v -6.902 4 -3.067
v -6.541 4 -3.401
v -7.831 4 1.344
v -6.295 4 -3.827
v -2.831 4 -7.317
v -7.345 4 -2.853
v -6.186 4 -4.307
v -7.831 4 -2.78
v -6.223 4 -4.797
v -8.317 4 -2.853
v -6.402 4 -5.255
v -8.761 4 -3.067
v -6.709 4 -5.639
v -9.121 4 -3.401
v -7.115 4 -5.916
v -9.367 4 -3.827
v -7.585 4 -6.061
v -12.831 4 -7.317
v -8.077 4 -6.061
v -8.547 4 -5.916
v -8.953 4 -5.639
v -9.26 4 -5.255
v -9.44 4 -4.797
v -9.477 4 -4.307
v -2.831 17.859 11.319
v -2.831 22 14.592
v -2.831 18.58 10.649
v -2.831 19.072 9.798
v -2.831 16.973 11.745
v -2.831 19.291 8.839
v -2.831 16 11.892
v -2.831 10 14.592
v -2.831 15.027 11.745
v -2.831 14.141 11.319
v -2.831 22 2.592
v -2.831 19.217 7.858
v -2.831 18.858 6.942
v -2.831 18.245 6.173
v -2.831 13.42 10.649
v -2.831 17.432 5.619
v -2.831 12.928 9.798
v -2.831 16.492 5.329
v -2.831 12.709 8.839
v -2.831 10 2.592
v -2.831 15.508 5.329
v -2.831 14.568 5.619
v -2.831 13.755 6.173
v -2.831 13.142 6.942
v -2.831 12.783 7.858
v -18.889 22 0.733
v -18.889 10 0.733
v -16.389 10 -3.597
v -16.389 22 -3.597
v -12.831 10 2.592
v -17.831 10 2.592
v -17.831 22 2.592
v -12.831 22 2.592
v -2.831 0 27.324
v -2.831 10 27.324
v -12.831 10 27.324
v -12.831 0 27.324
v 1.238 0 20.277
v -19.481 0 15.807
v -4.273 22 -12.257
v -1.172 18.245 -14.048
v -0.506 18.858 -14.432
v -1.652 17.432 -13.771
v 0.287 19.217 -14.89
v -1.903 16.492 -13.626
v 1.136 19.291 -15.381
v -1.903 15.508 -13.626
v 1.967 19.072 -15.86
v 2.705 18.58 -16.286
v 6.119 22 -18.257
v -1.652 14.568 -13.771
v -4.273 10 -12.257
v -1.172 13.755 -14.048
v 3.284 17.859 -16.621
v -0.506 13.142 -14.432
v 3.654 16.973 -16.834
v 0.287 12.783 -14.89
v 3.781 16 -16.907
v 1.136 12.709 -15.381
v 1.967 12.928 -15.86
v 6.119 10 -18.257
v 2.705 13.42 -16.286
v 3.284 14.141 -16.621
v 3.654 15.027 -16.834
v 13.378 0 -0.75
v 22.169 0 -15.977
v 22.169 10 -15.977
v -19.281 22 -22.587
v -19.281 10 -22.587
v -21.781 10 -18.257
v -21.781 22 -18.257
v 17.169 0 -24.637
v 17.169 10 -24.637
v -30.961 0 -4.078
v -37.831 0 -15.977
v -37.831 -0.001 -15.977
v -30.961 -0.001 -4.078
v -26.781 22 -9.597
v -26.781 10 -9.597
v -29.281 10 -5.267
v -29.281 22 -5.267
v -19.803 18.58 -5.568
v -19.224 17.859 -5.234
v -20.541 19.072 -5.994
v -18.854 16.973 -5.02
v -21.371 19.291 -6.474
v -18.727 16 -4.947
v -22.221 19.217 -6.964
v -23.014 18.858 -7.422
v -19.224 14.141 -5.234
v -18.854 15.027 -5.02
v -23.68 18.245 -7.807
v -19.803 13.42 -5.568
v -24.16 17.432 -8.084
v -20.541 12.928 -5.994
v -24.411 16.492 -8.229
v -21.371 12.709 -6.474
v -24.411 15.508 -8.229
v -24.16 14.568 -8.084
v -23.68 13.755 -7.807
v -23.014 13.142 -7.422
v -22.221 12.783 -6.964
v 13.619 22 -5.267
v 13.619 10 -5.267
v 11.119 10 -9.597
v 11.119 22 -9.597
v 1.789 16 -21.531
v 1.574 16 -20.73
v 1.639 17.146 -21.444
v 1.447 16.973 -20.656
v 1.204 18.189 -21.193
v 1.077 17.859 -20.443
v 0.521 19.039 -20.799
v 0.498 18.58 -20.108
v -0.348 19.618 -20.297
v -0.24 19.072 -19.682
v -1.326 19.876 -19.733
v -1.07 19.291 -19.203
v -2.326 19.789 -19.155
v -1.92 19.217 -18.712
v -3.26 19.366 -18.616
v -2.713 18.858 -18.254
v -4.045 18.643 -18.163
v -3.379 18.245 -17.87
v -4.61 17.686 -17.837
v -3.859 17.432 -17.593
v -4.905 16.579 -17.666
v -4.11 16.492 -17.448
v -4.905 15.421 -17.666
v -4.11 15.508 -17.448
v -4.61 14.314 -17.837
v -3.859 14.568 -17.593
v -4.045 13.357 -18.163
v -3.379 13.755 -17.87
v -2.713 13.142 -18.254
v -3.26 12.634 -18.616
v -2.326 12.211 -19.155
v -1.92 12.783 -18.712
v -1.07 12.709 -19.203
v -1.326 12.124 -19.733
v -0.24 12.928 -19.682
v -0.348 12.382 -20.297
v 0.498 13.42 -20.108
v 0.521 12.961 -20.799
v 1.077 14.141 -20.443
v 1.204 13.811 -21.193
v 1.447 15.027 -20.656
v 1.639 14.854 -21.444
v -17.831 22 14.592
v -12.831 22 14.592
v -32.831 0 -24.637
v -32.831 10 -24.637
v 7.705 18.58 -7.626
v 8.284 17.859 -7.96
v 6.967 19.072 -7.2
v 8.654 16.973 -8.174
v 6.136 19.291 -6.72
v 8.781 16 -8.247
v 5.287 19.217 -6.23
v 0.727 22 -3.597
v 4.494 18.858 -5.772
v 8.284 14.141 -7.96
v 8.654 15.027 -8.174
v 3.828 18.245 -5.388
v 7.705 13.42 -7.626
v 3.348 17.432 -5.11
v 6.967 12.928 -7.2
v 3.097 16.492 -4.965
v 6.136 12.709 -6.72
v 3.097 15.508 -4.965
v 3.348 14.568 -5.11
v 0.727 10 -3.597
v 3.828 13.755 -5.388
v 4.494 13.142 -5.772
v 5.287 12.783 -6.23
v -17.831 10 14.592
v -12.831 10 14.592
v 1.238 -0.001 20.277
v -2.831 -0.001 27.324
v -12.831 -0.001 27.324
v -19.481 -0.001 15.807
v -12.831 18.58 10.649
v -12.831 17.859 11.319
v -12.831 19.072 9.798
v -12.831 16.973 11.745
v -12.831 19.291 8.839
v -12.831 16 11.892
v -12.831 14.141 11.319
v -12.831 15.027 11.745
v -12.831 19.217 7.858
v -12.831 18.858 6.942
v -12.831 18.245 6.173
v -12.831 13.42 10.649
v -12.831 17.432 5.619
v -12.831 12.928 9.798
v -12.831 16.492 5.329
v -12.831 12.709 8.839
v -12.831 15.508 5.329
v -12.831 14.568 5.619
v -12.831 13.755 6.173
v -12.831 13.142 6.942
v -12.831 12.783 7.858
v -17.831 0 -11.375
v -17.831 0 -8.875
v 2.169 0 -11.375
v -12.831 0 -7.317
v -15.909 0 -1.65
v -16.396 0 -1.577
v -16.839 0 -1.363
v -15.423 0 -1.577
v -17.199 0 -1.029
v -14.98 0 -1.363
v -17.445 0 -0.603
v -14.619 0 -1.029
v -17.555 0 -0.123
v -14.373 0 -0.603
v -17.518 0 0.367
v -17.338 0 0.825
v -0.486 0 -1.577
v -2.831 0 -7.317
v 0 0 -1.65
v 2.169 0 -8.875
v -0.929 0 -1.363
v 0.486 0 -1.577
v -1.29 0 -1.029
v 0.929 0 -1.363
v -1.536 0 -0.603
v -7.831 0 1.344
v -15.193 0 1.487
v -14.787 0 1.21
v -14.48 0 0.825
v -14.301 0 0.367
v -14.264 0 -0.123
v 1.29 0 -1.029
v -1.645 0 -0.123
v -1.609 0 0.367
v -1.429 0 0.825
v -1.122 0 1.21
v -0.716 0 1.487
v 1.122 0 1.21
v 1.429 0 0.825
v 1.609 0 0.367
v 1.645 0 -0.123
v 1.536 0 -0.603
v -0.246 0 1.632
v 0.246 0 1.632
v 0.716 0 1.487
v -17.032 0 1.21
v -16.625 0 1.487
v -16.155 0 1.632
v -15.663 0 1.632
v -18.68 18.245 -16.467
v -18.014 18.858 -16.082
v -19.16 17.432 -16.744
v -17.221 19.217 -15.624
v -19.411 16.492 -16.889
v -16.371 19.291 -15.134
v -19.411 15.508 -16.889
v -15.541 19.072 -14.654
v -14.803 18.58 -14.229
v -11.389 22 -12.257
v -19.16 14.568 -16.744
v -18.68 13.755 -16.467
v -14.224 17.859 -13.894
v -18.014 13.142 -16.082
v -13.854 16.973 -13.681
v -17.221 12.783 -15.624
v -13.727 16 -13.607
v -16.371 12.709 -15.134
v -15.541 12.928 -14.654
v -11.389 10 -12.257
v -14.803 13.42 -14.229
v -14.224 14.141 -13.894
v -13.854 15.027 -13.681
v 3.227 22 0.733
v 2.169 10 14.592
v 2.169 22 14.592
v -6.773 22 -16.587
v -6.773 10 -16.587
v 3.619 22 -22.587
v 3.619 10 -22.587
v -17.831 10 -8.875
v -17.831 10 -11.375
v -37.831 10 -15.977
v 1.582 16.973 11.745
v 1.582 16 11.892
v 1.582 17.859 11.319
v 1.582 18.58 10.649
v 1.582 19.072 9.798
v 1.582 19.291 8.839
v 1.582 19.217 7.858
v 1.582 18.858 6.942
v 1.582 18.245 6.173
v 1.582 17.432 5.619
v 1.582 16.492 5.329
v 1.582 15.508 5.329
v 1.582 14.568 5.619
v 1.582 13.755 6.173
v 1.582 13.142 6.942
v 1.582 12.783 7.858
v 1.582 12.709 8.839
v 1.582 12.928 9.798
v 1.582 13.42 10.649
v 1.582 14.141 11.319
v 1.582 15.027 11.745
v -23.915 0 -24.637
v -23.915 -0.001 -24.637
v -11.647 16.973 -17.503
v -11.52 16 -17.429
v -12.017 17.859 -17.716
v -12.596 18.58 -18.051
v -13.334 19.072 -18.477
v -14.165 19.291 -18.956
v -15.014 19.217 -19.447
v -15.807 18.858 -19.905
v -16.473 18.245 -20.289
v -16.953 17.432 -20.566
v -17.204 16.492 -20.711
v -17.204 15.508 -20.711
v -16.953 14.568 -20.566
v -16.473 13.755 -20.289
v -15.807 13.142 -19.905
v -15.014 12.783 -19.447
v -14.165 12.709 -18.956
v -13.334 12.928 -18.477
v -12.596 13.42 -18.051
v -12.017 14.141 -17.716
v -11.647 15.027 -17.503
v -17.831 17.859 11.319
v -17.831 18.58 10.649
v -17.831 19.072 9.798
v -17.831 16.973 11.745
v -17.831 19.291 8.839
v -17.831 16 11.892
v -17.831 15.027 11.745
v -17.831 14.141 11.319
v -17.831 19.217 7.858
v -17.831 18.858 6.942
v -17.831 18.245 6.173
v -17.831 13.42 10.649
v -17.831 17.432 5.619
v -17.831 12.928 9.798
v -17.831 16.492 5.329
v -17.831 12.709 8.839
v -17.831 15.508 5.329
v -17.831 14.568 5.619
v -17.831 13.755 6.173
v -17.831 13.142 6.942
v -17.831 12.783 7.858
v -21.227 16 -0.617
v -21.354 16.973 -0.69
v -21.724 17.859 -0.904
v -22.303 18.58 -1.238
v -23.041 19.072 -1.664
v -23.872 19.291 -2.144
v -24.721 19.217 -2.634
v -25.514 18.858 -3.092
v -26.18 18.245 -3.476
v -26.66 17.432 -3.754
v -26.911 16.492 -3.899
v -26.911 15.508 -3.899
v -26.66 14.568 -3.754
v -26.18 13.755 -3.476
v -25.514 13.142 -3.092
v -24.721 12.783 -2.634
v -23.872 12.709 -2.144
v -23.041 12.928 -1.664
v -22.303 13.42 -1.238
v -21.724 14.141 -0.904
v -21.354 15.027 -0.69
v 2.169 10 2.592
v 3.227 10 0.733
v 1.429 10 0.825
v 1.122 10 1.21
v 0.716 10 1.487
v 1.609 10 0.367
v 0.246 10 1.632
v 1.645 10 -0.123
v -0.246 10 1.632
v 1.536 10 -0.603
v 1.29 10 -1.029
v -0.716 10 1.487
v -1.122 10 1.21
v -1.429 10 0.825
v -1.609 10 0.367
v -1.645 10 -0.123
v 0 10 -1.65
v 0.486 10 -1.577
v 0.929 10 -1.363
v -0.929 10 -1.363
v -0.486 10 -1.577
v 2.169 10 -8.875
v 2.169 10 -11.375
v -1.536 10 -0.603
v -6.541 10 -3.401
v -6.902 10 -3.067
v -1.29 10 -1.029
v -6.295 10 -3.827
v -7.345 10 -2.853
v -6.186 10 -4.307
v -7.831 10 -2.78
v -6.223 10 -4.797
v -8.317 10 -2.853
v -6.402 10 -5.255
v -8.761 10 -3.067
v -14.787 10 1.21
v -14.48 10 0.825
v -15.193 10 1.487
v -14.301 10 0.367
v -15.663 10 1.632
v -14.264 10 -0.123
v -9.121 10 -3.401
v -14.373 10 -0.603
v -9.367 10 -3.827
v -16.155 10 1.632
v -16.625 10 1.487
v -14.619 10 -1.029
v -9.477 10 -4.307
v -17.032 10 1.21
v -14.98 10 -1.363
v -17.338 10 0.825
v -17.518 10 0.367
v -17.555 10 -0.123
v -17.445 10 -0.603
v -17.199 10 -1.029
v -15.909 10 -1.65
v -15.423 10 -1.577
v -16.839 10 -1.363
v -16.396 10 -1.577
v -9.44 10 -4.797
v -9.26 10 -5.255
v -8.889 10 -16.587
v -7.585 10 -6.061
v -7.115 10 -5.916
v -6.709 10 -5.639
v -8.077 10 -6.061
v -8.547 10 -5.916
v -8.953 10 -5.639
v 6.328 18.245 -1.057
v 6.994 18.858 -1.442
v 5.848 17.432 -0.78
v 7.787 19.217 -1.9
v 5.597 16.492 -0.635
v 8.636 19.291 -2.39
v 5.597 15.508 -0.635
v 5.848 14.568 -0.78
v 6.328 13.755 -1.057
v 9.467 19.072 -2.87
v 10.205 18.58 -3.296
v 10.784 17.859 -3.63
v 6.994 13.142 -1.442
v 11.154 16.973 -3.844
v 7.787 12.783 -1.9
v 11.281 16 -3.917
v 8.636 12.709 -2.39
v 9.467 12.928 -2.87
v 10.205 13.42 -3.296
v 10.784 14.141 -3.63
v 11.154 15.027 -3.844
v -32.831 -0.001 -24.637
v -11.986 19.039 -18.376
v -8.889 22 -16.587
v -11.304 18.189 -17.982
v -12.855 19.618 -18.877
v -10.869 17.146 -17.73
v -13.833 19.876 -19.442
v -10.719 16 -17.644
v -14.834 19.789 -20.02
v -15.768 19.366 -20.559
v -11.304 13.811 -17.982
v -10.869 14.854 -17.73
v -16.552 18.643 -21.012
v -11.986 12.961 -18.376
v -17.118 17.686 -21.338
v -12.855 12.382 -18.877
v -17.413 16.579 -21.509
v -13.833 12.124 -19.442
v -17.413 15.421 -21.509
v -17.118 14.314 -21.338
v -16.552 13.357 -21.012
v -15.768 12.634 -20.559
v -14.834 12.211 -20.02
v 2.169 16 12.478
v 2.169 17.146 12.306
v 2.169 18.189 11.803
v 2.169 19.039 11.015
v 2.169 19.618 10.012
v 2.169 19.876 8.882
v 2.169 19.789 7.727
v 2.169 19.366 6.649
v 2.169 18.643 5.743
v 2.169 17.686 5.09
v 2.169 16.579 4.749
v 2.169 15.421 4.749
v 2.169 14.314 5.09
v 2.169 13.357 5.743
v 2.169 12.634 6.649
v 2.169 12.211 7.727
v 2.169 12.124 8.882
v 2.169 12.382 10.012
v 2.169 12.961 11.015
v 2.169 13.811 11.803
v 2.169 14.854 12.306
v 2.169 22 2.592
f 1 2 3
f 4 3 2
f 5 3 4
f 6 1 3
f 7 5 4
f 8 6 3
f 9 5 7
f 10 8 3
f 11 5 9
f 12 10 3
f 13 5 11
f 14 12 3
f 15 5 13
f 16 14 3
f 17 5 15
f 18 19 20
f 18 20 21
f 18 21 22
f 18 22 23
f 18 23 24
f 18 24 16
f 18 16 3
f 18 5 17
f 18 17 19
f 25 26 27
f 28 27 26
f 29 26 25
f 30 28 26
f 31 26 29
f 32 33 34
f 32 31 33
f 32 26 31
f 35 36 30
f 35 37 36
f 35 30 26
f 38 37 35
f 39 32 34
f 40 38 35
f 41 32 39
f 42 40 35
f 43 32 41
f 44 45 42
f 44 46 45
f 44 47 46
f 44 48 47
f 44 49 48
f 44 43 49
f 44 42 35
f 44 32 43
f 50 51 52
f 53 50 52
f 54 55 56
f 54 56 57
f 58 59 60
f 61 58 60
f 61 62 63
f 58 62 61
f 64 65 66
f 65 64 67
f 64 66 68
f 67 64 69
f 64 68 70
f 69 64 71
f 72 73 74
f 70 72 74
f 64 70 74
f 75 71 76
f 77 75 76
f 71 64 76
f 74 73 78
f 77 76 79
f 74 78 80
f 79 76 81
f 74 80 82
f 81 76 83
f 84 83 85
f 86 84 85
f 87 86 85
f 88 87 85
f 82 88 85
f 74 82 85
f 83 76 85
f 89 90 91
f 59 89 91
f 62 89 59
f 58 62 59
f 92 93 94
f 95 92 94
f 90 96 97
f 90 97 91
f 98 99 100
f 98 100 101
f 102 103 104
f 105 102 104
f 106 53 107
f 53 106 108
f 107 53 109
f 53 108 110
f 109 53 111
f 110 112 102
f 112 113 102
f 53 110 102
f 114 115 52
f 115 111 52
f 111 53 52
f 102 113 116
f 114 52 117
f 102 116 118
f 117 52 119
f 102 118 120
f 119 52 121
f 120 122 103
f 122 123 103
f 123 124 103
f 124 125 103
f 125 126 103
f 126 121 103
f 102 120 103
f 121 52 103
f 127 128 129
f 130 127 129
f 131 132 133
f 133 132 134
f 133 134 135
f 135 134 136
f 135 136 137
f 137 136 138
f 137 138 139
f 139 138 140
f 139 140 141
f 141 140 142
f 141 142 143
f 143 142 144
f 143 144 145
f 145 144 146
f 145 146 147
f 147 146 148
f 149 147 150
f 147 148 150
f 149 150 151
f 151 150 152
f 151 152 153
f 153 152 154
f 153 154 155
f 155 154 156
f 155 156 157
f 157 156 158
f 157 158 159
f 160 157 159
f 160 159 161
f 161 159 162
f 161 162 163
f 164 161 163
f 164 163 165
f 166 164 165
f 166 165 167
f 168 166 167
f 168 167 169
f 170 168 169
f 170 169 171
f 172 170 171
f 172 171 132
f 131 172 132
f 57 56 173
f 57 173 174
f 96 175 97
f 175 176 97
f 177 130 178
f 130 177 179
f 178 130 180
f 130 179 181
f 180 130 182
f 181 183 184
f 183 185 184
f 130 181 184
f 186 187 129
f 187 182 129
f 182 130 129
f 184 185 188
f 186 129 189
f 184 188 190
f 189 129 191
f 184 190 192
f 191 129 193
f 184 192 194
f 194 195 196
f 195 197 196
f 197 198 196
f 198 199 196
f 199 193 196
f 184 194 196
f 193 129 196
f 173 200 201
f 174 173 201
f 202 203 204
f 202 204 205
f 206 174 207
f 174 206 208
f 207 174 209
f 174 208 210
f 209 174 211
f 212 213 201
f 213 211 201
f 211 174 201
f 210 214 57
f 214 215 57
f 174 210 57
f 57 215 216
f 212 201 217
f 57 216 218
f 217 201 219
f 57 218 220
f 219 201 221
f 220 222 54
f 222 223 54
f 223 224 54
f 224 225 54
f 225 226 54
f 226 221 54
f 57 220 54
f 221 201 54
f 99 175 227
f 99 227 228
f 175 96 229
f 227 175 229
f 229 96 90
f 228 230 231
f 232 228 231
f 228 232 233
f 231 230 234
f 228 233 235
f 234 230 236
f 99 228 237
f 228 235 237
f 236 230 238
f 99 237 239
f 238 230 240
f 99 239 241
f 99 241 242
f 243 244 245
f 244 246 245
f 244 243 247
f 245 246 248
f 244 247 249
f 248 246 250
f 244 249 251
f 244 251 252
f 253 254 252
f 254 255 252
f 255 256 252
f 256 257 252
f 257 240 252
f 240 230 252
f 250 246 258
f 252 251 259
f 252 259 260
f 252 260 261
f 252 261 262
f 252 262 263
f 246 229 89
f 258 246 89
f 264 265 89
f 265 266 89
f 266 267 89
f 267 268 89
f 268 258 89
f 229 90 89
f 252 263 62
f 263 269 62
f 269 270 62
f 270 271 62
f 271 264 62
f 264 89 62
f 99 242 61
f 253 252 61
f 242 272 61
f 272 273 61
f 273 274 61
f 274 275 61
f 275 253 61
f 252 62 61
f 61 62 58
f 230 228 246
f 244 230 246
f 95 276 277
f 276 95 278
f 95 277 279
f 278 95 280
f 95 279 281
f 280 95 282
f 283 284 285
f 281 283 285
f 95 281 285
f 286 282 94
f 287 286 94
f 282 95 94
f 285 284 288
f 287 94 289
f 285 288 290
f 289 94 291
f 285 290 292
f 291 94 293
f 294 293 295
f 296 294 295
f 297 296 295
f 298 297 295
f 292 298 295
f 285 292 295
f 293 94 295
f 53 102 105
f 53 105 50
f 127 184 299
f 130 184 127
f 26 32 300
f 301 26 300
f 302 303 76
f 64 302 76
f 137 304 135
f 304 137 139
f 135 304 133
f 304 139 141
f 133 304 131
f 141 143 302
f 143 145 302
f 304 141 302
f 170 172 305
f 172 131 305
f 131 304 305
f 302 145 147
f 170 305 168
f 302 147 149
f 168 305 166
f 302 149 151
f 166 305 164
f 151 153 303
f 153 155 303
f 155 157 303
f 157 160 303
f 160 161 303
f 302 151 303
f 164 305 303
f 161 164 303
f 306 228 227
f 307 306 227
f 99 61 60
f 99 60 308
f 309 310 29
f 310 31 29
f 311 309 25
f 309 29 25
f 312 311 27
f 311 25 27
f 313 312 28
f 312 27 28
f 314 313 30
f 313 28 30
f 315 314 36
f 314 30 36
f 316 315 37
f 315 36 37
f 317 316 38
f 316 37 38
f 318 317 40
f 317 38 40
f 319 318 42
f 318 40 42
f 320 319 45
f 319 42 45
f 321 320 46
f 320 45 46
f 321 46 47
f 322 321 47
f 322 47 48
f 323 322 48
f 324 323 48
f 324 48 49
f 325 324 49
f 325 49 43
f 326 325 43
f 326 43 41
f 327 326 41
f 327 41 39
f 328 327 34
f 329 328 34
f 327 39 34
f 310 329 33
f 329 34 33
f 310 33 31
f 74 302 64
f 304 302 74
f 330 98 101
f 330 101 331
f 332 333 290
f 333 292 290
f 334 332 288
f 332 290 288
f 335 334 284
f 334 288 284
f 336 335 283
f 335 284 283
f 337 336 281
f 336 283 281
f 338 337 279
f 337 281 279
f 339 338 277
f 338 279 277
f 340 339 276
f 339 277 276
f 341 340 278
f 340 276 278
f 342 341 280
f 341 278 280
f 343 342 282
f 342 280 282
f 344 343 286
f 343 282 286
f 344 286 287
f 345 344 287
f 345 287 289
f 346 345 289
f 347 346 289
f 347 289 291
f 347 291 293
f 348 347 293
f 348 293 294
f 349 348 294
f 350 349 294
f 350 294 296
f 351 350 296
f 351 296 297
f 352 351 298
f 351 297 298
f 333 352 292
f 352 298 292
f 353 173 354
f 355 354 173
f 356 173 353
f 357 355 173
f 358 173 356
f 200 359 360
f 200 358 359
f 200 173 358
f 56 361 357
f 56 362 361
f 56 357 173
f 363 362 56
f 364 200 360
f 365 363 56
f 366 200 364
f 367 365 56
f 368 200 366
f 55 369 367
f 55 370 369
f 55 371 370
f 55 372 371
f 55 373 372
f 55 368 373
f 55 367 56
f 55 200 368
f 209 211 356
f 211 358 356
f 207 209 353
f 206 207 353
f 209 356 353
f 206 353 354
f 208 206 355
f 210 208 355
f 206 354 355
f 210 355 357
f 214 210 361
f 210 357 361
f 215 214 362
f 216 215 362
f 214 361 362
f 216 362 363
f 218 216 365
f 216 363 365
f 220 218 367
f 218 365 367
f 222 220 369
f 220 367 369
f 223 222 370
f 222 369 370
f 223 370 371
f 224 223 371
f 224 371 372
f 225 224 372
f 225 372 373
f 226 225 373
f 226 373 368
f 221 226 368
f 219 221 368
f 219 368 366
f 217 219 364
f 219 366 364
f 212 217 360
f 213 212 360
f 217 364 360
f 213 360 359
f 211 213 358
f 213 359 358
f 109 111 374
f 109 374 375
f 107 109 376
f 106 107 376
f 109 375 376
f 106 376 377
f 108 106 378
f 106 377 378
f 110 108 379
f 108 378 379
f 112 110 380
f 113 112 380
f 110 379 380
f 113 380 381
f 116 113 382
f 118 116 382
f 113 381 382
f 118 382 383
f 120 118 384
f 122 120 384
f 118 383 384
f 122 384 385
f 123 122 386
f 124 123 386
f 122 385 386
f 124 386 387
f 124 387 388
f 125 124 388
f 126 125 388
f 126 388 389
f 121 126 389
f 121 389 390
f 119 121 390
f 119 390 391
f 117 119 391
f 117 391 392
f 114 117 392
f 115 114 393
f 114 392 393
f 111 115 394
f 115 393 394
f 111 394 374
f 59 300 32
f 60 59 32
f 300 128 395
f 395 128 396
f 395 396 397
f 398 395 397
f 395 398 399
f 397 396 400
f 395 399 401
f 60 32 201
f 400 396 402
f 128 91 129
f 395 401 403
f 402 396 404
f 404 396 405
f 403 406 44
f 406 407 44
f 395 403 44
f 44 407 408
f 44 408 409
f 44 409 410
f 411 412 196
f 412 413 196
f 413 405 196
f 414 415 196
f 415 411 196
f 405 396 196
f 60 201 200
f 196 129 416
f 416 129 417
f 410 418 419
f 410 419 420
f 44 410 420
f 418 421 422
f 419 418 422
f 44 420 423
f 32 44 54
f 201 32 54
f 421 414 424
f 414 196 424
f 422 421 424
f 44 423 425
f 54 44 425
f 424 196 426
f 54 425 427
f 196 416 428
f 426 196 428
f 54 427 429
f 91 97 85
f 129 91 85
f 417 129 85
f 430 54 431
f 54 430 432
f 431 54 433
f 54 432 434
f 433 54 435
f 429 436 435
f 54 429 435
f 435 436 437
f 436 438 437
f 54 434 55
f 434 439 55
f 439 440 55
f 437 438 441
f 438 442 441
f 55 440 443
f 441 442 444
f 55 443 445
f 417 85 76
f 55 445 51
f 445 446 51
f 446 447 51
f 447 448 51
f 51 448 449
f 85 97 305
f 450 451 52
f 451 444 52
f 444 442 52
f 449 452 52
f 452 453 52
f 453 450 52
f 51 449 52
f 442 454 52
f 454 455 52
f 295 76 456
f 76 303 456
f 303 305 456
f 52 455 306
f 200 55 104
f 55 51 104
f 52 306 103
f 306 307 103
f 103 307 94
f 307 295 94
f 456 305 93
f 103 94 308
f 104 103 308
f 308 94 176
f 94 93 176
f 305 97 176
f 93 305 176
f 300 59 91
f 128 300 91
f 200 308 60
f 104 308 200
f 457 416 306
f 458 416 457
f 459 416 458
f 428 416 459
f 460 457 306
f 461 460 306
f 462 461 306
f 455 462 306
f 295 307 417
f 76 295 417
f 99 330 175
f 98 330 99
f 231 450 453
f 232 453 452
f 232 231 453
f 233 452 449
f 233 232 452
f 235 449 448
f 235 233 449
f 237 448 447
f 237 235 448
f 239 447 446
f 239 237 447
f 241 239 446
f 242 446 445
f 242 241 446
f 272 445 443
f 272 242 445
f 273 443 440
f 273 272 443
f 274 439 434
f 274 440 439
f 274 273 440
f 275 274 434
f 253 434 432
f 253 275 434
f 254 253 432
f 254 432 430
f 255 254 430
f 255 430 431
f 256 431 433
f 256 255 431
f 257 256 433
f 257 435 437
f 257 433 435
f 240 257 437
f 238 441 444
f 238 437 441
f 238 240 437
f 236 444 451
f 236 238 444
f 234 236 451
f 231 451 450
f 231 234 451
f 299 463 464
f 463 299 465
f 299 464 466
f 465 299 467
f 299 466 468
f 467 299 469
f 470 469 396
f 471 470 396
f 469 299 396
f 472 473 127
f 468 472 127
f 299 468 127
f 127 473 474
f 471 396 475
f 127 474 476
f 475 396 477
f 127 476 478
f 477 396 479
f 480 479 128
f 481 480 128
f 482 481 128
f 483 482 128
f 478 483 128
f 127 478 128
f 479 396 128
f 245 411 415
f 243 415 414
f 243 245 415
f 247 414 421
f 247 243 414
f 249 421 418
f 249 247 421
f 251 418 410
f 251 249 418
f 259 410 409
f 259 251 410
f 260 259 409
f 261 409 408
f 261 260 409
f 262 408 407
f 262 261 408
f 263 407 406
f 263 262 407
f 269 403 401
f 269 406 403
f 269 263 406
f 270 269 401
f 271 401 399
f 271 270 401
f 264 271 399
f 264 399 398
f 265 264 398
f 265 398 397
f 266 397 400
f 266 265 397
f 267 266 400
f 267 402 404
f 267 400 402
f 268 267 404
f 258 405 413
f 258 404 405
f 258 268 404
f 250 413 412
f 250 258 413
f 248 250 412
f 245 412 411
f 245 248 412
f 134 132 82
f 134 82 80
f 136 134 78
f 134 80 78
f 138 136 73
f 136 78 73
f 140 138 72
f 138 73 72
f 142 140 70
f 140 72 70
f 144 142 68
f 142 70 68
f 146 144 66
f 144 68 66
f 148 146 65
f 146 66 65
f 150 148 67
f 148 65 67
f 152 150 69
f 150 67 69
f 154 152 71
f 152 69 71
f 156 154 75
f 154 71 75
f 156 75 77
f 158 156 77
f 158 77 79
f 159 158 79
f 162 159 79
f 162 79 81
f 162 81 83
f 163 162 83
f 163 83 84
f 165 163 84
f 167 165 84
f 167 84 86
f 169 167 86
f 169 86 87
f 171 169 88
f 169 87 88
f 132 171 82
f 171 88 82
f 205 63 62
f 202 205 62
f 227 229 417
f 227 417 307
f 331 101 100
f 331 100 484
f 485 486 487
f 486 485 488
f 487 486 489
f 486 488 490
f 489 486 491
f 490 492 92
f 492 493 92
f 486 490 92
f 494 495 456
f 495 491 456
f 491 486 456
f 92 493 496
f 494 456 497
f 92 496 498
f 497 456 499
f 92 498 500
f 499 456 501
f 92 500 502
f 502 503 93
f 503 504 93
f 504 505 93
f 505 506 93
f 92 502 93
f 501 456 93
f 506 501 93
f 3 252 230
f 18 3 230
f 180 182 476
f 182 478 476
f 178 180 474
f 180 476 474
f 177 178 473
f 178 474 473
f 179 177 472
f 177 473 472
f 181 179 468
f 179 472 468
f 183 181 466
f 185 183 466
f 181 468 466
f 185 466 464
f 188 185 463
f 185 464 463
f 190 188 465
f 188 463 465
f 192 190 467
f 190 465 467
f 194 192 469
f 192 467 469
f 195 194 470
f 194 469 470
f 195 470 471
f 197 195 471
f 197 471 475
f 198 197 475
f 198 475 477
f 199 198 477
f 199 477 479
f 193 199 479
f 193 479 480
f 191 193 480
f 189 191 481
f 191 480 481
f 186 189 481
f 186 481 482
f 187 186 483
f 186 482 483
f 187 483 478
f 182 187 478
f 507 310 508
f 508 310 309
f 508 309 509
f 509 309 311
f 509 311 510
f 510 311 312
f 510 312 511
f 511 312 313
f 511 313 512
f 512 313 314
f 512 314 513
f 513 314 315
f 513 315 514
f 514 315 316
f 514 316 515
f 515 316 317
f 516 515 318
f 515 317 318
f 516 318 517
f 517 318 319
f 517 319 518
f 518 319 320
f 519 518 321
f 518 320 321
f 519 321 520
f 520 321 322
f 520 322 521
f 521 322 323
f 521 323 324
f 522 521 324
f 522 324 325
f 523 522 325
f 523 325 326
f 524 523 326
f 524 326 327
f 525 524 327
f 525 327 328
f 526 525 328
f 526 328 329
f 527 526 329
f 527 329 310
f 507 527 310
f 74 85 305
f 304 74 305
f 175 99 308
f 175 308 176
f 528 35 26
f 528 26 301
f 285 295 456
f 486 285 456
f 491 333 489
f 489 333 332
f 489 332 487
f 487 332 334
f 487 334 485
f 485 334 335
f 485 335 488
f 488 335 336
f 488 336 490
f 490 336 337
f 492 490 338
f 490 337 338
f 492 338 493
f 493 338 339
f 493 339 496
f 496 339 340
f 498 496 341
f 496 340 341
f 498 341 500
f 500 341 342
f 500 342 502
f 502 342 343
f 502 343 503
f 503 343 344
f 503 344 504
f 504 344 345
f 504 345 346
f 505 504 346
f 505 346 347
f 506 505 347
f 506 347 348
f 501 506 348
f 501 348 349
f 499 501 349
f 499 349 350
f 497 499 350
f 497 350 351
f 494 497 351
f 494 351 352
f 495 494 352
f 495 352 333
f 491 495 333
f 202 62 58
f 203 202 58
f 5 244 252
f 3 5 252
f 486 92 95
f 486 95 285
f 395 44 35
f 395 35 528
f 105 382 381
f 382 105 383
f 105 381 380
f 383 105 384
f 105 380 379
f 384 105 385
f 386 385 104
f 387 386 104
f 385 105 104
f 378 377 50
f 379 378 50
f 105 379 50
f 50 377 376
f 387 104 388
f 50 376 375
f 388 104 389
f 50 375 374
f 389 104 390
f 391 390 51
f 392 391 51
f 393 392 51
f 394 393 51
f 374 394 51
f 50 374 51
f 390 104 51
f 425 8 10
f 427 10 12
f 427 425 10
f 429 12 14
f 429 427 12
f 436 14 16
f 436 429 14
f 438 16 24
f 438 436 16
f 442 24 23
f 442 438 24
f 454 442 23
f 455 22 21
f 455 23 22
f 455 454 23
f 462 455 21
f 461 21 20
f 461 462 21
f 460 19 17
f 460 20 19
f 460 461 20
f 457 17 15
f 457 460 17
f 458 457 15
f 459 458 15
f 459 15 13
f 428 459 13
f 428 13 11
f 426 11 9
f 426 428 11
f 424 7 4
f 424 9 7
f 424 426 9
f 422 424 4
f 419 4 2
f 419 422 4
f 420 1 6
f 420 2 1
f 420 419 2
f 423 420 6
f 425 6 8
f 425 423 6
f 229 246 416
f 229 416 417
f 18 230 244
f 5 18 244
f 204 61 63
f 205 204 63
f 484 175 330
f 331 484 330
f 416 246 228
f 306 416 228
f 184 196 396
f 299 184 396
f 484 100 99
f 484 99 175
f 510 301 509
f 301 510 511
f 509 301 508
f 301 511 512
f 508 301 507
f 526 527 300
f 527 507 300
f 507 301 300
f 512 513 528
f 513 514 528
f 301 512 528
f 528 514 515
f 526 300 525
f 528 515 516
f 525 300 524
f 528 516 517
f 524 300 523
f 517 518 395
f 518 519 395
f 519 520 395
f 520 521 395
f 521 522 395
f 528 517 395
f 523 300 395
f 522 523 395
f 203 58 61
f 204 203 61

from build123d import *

# Parameters (mm, degrees)
EXTRUDE_1_DEPTH                 = 10
SKETCH_2_W                      = 5
SKETCH_2_H                      = 12
EXTRUDE_4_DEPTH                 = 12
HOLE_WIZARD_G1_16_1_D           = 6.6
HOLE_WIZARD_G1_16_1_DEPTH       = 50
HOLE_WIZARD_G1_16_1_CSINK_D     = 7.773
HOLE_WIZARD_G1_16_1_CSINK_ANGLE = 90
HOLE_WIZARD_G1_16_1_TIP         = 1.982840043
HOLE_WIZARD_G1_16_2_D           = 6.6
HOLE_WIZARD_G1_16_2_DEPTH       = 50
HOLE_WIZARD_G1_16_2_CSINK_D     = 7.773
HOLE_WIZARD_G1_16_2_CSINK_ANGLE = 90
HOLE_WIZARD_G1_16_2_TIP         = 1.982840043
HOLE_WIZARD_G1_16_3_D           = 6.6
HOLE_WIZARD_G1_16_3_DEPTH       = 50
HOLE_WIZARD_G1_16_3_CSINK_D     = 7.773
HOLE_WIZARD_G1_16_3_CSINK_ANGLE = 90
HOLE_WIZARD_G1_16_3_TIP         = 1.982840043
EXTRUDE_5_DEPTH                 = 40
SKETCH_19_W                     = 50
SKETCH_19_H                     = 30
CUT_EXTRUDE_2_DEPTH             = 74
EXTRUDE_6_DEPTH                 = 40
SKETCH_23_R                     = 1.5
CUT_EXTRUDE_3_DEPTH             = 6
SPLIT_BODIES_1_SURFACE_1_BACK   = 101.717
SPLIT_BODIES_1_SURFACE_1_DEPTH  = 203.434
SPLIT_BODIES_1_SURFACE_2_BACK   = 101.717
SPLIT_BODIES_1_SURFACE_2_DEPTH  = 203.434
SKETCH_26_W                     = 78.052093204
SKETCH_26_H                     = 42.58927149
CUT_EXTRUDE_5_DEPTH             = 147
CUT_EXTRUDE_6_DEPTH             = 4
SKETCH_30_W                     = 20
SKETCH_30_H                     = 2.5
CUT_EXTRUDE_7_DEPTH             = 10
HOLE_WIZARD_M4_2_AT_2_COUNT     = 2
HOLE_WIZARD_M4_2_AT_2_PITCH     = 15.909397414


with BuildPart() as part:
    # 草图1 → 凸台-拉伸1 (new body)
    with BuildSketch(Plane(origin=(0, 0, 0), x_dir=(1, 0, 0), z_dir=(0, 1, 0))):
        Polygon((-32.831152269, 24.637065757), (17.168847731, 24.637065757), (22.168847731, 15.976811719), (-2.831152269, -27.32445847), (-12.831152269, -27.32445847), (-37.831152269, 15.976811719), align=None)
    extrude(amount=EXTRUDE_1_DEPTH)

    # 草图2 → 凸台-拉伸4 (add)
    with BuildSketch(Plane(origin=(0, 10, 0), x_dir=(1, 0, 0), z_dir=(0, 1, 0))):
        Polygon((-18.888926711, -0.733069557), (-16.388914662, 3.597050504), (-26.78120281, 9.597079424), (-29.28121486, 5.266959362), align=None)
        Polygon((-11.388890562, 12.257290628), (-8.888878512, 16.58741069), (-19.28116666, 22.58743961), (-21.78117871, 18.257319548), align=None)
        Polygon((-4.273413977, 12.257290628), (6.118874171, 18.257319548), (3.618862121, 22.58743961), (-6.773426027, 16.58741069), align=None)
        Polygon((3.226622172, -0.733069557), (13.618910321, 5.266959362), (11.118898271, 9.597079424), (0.726610123, 3.597050504), align=None)
        with Locations((-0.331152269, -8.591935763)):
            Rectangle(SKETCH_2_W, SKETCH_2_H)
        with Locations((-15.331152269, -8.591935763)):
            Rectangle(SKETCH_2_W, SKETCH_2_H)
    extrude(amount=EXTRUDE_4_DEPTH)

    # G1/16 螺纹孔1
    with Locations(Plane(origin=(4.96034155, 0, -8.591508373), x_dir=(-0.8660240123793532, 0, -0.500002409976558), z_dir=(0.500002409976558, 0, -0.8660240123793532))):
        with Locations((21.991727555, 16)):
            CounterSinkHole(HOLE_WIZARD_G1_16_1_D / 2, HOLE_WIZARD_G1_16_1_CSINK_D / 2, depth=HOLE_WIZARD_G1_16_1_DEPTH, counter_sink_angle=HOLE_WIZARD_G1_16_1_CSINK_ANGLE)
            with Locations((0, 0, -(HOLE_WIZARD_G1_16_1_DEPTH + HOLE_WIZARD_G1_16_1_TIP / 2))):  # 118° drill point
                Cone(0, HOLE_WIZARD_G1_16_1_D / 2, HOLE_WIZARD_G1_16_1_TIP, mode=Mode.SUBTRACT)

    # G1/16 螺纹孔2
    with Locations(Plane(origin=(-8.875955431, 0, -15.373506972), x_dir=(-0.8660240123793504, 0, 0.5000024099765628), z_dir=(-0.5000024099765628, 0, -0.8660240123793506))):
        with Locations((-8.427795735, 16)):
            CounterSinkHole(HOLE_WIZARD_G1_16_2_D / 2, HOLE_WIZARD_G1_16_2_CSINK_D / 2, depth=HOLE_WIZARD_G1_16_2_DEPTH, counter_sink_angle=HOLE_WIZARD_G1_16_2_CSINK_ANGLE)
            with Locations((0, 0, -(HOLE_WIZARD_G1_16_2_DEPTH + HOLE_WIZARD_G1_16_2_TIP / 2))):  # 118° drill point
                Cone(0, HOLE_WIZARD_G1_16_2_D / 2, HOLE_WIZARD_G1_16_2_TIP, mode=Mode.SUBTRACT)

    # G1/16 螺纹孔3
    with Locations(Plane(origin=(2.168847731, 0, 0), x_dir=(0, 0, -1), z_dir=(1, 0, 0))):
        with Locations((-8.591935763, 16)):
            CounterSinkHole(HOLE_WIZARD_G1_16_3_D / 2, HOLE_WIZARD_G1_16_3_CSINK_D / 2, depth=HOLE_WIZARD_G1_16_3_DEPTH, counter_sink_angle=HOLE_WIZARD_G1_16_3_CSINK_ANGLE)
            with Locations((0, 0, -(HOLE_WIZARD_G1_16_3_DEPTH + HOLE_WIZARD_G1_16_3_TIP / 2))):  # 118° drill point
                Cone(0, HOLE_WIZARD_G1_16_3_D / 2, HOLE_WIZARD_G1_16_3_TIP, mode=Mode.SUBTRACT)

    # 草图18 → 凸台-拉伸5 (add)
    with BuildSketch(Plane(origin=(0, 0, 0), x_dir=(-1, 0, 0), z_dir=(0, -1, 0))):
        Polygon((36.516059441, -12.131432542), (30.961139109, 4.077599876), (19.480871434, -15.806807021), align=None)
        Polygon((30.961139109, 4.077599876), (23.915302437, 24.637065757), (-1.237762159, -20.276891949), (19.480871434, -15.806807021), align=None)
        Polygon((23.915302437, 24.637065757), (0, 24.637065757), (-13.377530598, 0.749803781), (-1.237762159, -20.276891949), align=None)
    extrude(amount=EXTRUDE_5_DEPTH)

    # 草图19 → 切除-拉伸2 (cut)
    with BuildSketch(Plane(origin=(-4.125141126, 0, 19.119835281), x_dir=(0.9775078175150543, 0, 0.21089918609837094), z_dir=(-0.21089918609837097, 0, 0.9775078175150544))):
        with Locations((-8.136224319, -15)):
            Rectangle(SKETCH_19_W, SKETCH_19_H)
    extrude(amount=-CUT_EXTRUDE_2_DEPTH, mode=Mode.SUBTRACT)


with BuildPart() as cut_extrude_2_piece_1:
    # of the separate pieces the step leaves, piece 1, a body of its own (cut_extrude_2_pieces)
    add(part.part.solids().sort_by_distance((17.168847731, 0, -24.637065757))[0])



with BuildPart() as cut_extrude_2_piece_2:
    # of the separate pieces the step leaves, piece 2, a body of its own (cut_extrude_2_pieces)
    add(part.part.solids().sort_by_distance((-23.915302437, -30, -24.637065757))[0])


with BuildPart() as cut_extrude_2_piece_1_1:
    add(cut_extrude_2_piece_1.part)

    add(cut_extrude_2_piece_2.part)  # 凸台-拉伸6 merges 切除-拉伸2 piece 2
    # 草图20 → 凸台-拉伸6 (add)
    with BuildSketch(Plane.XZ):
        Polygon((-12.831152269, 27.32445847), (-19.480871434, 15.806807021), (1.237762159, 20.276891949), (-2.831152269, 27.32445847), align=None)
        Polygon((-37.831152269, -15.976811719), (-30.961139109, -4.077599876), (-23.915302437, -24.637065757), (-32.831152269, -24.637065757), align=None)
    extrude(amount=EXTRUDE_6_DEPTH)

    # 草图23 → 切除-拉伸3 (cut)
    with BuildSketch(Plane(origin=(0, -30, 0), x_dir=(1, 0, 0), z_dir=(0, 1, 0))):
        with Locations(Location((0.168847731, -0.188995818, 0), (0, 0, 270))):
            Circle(SKETCH_23_R)
        with Locations(Location((-7.831152269, 13.667410642, 0), (0, 0, 270))):
            Circle(SKETCH_23_R)
    extrude(amount=-CUT_EXTRUDE_3_DEPTH, mode=Mode.SUBTRACT)


with BuildPart() as body_2:
    # Split Bodies 1: the piece behind the surface
    add(cut_extrude_2_piece_1_1.part)
    # Split Bodies 1 surface: a surface, the sketch's curves swept straight by 203.434 mm
    with BuildLine(Plane(origin=(-35.291526612, 0, -20.37557239), x_dir=(-0.4999999999999961, 0, 0.866025403784441), z_dir=(-0.866025403784441, 0, -0.4999999999999961)).offset(-SPLIT_BODIES_1_SURFACE_1_BACK), mode=Mode.PRIVATE) as split_bodies_1_surface_1_path:
        Line((-9.378673602, 0), (48.060747663, 0))
        Line((48.060747663, 0), (48.060747663, -0.001))
        Line((48.060747663, -0.001), (-9.378673602, -0.001))
        Line((-9.378673602, -0.001), (-9.378673602, 0))
    split_bodies_1_surface_1 = Shell.extrude(split_bodies_1_surface_1_path.wire(), (-0.866025404 * SPLIT_BODIES_1_SURFACE_1_DEPTH, 0 * SPLIT_BODIES_1_SURFACE_1_DEPTH, -0.5 * SPLIT_BODIES_1_SURFACE_1_DEPTH))
    split(bisect_by=split_bodies_1_surface_1, keep=Keep.BOTTOM)


with BuildPart() as cut_extrude_2_piece_1_2:
    add(cut_extrude_2_piece_1_1.part)

    # Split Bodies 1: split by a surface, the side it looks to stays
    # Split Bodies 1 surface: a surface, the sketch's curves swept straight by 203.434 mm
    with BuildLine(Plane(origin=(-35.291526612, 0, -20.37557239), x_dir=(-0.4999999999999961, 0, 0.866025403784441), z_dir=(-0.866025403784441, 0, -0.4999999999999961)).offset(-SPLIT_BODIES_1_SURFACE_2_BACK), mode=Mode.PRIVATE) as split_bodies_1_surface_2_path:
        Line((-9.378673602, 0), (48.060747663, 0))
        Line((48.060747663, 0), (48.060747663, -0.001))
        Line((48.060747663, -0.001), (-9.378673602, -0.001))
        Line((-9.378673602, -0.001), (-9.378673602, 0))
    split_bodies_1_surface_2 = Shell.extrude(split_bodies_1_surface_2_path.wire(), (-0.866025404 * SPLIT_BODIES_1_SURFACE_2_DEPTH, 0 * SPLIT_BODIES_1_SURFACE_2_DEPTH, -0.5 * SPLIT_BODIES_1_SURFACE_2_DEPTH))
    split(bisect_by=split_bodies_1_surface_2, keep=Keep.TOP)

    # 草图26 → 切除-拉伸5 (cut)
    with BuildSketch(Plane(origin=(9.708473388, 0, 5.605189724), x_dir=(0.49999999999999983, 0, -0.8660254037844388), z_dir=(0.8660254037844387, 0, 0.4999999999999998))):
        with Locations((-9.034701061, -21.295635745)):
            Rectangle(SKETCH_26_W, SKETCH_26_H)
    extrude(amount=-CUT_EXTRUDE_5_DEPTH, mode=Mode.SUBTRACT)

    # 草图28 → M4 螺纹孔1 (revolve, cut)
    with BuildSketch(Plane(origin=(-7.831152269, 10, -4.429806335), x_dir=(0, 0, 1), z_dir=(1, 0, 0))):
        Polygon((0, 0), (0, 11.091420021), (1.65, 10.1), (1.65, 0), align=None)
    revolve(axis=Axis((-7.831152269, 16.35, -4.429806335), (0, -1, 0)), mode=Mode.SUBTRACT)

    # 草图29 → 切除-拉伸6 (cut)
    with BuildSketch(Plane(origin=(0, 0, 0), x_dir=(-1, 0, 0), z_dir=(0, -1, 0))):
        Polygon((7.831152269, -1.343696357), (12.831152269, 7.316557681), (2.831152269, 7.316557681), align=None)
    extrude(amount=-CUT_EXTRUDE_6_DEPTH, mode=Mode.SUBTRACT)

    # 草图30 → 切除-拉伸7 (cut)
    with BuildSketch(Plane(origin=(0, 0, 0), x_dir=(-1, 0, 0), z_dir=(0, -1, 0))):
        with Locations((7.831152269, 10.124679252)):
            Rectangle(SKETCH_30_W, SKETCH_30_H)
    extrude(amount=-CUT_EXTRUDE_7_DEPTH, mode=Mode.SUBTRACT)

    # 草图32 → M4 螺纹孔2 (revolve, cut)
    with BuildSketch(Plane(origin=(0, 0, 0), x_dir=(0, 0, -1), z_dir=(1, 0, 0))):
        Polygon((0, 0), (0, 11.091420021), (1.65, 10.1), (1.65, 0), align=None)
    hole_wizard_m4_2 = revolve(axis=Axis((0, -6.35, 0), (0, 1, 0)), mode=Mode.SUBTRACT)

    # M4 螺纹孔2 at 2: M4 螺纹孔2 ×2
    with Locations(*[(-i * HOLE_WIZARD_M4_2_AT_2_PITCH, 0, 0) for i in range(1, HOLE_WIZARD_M4_2_AT_2_COUNT)]):
        add(hole_wizard_m4_2, mode=Mode.SUBTRACT)


solid = Compound([body_2.part, cut_extrude_2_piece_1_2.part])
